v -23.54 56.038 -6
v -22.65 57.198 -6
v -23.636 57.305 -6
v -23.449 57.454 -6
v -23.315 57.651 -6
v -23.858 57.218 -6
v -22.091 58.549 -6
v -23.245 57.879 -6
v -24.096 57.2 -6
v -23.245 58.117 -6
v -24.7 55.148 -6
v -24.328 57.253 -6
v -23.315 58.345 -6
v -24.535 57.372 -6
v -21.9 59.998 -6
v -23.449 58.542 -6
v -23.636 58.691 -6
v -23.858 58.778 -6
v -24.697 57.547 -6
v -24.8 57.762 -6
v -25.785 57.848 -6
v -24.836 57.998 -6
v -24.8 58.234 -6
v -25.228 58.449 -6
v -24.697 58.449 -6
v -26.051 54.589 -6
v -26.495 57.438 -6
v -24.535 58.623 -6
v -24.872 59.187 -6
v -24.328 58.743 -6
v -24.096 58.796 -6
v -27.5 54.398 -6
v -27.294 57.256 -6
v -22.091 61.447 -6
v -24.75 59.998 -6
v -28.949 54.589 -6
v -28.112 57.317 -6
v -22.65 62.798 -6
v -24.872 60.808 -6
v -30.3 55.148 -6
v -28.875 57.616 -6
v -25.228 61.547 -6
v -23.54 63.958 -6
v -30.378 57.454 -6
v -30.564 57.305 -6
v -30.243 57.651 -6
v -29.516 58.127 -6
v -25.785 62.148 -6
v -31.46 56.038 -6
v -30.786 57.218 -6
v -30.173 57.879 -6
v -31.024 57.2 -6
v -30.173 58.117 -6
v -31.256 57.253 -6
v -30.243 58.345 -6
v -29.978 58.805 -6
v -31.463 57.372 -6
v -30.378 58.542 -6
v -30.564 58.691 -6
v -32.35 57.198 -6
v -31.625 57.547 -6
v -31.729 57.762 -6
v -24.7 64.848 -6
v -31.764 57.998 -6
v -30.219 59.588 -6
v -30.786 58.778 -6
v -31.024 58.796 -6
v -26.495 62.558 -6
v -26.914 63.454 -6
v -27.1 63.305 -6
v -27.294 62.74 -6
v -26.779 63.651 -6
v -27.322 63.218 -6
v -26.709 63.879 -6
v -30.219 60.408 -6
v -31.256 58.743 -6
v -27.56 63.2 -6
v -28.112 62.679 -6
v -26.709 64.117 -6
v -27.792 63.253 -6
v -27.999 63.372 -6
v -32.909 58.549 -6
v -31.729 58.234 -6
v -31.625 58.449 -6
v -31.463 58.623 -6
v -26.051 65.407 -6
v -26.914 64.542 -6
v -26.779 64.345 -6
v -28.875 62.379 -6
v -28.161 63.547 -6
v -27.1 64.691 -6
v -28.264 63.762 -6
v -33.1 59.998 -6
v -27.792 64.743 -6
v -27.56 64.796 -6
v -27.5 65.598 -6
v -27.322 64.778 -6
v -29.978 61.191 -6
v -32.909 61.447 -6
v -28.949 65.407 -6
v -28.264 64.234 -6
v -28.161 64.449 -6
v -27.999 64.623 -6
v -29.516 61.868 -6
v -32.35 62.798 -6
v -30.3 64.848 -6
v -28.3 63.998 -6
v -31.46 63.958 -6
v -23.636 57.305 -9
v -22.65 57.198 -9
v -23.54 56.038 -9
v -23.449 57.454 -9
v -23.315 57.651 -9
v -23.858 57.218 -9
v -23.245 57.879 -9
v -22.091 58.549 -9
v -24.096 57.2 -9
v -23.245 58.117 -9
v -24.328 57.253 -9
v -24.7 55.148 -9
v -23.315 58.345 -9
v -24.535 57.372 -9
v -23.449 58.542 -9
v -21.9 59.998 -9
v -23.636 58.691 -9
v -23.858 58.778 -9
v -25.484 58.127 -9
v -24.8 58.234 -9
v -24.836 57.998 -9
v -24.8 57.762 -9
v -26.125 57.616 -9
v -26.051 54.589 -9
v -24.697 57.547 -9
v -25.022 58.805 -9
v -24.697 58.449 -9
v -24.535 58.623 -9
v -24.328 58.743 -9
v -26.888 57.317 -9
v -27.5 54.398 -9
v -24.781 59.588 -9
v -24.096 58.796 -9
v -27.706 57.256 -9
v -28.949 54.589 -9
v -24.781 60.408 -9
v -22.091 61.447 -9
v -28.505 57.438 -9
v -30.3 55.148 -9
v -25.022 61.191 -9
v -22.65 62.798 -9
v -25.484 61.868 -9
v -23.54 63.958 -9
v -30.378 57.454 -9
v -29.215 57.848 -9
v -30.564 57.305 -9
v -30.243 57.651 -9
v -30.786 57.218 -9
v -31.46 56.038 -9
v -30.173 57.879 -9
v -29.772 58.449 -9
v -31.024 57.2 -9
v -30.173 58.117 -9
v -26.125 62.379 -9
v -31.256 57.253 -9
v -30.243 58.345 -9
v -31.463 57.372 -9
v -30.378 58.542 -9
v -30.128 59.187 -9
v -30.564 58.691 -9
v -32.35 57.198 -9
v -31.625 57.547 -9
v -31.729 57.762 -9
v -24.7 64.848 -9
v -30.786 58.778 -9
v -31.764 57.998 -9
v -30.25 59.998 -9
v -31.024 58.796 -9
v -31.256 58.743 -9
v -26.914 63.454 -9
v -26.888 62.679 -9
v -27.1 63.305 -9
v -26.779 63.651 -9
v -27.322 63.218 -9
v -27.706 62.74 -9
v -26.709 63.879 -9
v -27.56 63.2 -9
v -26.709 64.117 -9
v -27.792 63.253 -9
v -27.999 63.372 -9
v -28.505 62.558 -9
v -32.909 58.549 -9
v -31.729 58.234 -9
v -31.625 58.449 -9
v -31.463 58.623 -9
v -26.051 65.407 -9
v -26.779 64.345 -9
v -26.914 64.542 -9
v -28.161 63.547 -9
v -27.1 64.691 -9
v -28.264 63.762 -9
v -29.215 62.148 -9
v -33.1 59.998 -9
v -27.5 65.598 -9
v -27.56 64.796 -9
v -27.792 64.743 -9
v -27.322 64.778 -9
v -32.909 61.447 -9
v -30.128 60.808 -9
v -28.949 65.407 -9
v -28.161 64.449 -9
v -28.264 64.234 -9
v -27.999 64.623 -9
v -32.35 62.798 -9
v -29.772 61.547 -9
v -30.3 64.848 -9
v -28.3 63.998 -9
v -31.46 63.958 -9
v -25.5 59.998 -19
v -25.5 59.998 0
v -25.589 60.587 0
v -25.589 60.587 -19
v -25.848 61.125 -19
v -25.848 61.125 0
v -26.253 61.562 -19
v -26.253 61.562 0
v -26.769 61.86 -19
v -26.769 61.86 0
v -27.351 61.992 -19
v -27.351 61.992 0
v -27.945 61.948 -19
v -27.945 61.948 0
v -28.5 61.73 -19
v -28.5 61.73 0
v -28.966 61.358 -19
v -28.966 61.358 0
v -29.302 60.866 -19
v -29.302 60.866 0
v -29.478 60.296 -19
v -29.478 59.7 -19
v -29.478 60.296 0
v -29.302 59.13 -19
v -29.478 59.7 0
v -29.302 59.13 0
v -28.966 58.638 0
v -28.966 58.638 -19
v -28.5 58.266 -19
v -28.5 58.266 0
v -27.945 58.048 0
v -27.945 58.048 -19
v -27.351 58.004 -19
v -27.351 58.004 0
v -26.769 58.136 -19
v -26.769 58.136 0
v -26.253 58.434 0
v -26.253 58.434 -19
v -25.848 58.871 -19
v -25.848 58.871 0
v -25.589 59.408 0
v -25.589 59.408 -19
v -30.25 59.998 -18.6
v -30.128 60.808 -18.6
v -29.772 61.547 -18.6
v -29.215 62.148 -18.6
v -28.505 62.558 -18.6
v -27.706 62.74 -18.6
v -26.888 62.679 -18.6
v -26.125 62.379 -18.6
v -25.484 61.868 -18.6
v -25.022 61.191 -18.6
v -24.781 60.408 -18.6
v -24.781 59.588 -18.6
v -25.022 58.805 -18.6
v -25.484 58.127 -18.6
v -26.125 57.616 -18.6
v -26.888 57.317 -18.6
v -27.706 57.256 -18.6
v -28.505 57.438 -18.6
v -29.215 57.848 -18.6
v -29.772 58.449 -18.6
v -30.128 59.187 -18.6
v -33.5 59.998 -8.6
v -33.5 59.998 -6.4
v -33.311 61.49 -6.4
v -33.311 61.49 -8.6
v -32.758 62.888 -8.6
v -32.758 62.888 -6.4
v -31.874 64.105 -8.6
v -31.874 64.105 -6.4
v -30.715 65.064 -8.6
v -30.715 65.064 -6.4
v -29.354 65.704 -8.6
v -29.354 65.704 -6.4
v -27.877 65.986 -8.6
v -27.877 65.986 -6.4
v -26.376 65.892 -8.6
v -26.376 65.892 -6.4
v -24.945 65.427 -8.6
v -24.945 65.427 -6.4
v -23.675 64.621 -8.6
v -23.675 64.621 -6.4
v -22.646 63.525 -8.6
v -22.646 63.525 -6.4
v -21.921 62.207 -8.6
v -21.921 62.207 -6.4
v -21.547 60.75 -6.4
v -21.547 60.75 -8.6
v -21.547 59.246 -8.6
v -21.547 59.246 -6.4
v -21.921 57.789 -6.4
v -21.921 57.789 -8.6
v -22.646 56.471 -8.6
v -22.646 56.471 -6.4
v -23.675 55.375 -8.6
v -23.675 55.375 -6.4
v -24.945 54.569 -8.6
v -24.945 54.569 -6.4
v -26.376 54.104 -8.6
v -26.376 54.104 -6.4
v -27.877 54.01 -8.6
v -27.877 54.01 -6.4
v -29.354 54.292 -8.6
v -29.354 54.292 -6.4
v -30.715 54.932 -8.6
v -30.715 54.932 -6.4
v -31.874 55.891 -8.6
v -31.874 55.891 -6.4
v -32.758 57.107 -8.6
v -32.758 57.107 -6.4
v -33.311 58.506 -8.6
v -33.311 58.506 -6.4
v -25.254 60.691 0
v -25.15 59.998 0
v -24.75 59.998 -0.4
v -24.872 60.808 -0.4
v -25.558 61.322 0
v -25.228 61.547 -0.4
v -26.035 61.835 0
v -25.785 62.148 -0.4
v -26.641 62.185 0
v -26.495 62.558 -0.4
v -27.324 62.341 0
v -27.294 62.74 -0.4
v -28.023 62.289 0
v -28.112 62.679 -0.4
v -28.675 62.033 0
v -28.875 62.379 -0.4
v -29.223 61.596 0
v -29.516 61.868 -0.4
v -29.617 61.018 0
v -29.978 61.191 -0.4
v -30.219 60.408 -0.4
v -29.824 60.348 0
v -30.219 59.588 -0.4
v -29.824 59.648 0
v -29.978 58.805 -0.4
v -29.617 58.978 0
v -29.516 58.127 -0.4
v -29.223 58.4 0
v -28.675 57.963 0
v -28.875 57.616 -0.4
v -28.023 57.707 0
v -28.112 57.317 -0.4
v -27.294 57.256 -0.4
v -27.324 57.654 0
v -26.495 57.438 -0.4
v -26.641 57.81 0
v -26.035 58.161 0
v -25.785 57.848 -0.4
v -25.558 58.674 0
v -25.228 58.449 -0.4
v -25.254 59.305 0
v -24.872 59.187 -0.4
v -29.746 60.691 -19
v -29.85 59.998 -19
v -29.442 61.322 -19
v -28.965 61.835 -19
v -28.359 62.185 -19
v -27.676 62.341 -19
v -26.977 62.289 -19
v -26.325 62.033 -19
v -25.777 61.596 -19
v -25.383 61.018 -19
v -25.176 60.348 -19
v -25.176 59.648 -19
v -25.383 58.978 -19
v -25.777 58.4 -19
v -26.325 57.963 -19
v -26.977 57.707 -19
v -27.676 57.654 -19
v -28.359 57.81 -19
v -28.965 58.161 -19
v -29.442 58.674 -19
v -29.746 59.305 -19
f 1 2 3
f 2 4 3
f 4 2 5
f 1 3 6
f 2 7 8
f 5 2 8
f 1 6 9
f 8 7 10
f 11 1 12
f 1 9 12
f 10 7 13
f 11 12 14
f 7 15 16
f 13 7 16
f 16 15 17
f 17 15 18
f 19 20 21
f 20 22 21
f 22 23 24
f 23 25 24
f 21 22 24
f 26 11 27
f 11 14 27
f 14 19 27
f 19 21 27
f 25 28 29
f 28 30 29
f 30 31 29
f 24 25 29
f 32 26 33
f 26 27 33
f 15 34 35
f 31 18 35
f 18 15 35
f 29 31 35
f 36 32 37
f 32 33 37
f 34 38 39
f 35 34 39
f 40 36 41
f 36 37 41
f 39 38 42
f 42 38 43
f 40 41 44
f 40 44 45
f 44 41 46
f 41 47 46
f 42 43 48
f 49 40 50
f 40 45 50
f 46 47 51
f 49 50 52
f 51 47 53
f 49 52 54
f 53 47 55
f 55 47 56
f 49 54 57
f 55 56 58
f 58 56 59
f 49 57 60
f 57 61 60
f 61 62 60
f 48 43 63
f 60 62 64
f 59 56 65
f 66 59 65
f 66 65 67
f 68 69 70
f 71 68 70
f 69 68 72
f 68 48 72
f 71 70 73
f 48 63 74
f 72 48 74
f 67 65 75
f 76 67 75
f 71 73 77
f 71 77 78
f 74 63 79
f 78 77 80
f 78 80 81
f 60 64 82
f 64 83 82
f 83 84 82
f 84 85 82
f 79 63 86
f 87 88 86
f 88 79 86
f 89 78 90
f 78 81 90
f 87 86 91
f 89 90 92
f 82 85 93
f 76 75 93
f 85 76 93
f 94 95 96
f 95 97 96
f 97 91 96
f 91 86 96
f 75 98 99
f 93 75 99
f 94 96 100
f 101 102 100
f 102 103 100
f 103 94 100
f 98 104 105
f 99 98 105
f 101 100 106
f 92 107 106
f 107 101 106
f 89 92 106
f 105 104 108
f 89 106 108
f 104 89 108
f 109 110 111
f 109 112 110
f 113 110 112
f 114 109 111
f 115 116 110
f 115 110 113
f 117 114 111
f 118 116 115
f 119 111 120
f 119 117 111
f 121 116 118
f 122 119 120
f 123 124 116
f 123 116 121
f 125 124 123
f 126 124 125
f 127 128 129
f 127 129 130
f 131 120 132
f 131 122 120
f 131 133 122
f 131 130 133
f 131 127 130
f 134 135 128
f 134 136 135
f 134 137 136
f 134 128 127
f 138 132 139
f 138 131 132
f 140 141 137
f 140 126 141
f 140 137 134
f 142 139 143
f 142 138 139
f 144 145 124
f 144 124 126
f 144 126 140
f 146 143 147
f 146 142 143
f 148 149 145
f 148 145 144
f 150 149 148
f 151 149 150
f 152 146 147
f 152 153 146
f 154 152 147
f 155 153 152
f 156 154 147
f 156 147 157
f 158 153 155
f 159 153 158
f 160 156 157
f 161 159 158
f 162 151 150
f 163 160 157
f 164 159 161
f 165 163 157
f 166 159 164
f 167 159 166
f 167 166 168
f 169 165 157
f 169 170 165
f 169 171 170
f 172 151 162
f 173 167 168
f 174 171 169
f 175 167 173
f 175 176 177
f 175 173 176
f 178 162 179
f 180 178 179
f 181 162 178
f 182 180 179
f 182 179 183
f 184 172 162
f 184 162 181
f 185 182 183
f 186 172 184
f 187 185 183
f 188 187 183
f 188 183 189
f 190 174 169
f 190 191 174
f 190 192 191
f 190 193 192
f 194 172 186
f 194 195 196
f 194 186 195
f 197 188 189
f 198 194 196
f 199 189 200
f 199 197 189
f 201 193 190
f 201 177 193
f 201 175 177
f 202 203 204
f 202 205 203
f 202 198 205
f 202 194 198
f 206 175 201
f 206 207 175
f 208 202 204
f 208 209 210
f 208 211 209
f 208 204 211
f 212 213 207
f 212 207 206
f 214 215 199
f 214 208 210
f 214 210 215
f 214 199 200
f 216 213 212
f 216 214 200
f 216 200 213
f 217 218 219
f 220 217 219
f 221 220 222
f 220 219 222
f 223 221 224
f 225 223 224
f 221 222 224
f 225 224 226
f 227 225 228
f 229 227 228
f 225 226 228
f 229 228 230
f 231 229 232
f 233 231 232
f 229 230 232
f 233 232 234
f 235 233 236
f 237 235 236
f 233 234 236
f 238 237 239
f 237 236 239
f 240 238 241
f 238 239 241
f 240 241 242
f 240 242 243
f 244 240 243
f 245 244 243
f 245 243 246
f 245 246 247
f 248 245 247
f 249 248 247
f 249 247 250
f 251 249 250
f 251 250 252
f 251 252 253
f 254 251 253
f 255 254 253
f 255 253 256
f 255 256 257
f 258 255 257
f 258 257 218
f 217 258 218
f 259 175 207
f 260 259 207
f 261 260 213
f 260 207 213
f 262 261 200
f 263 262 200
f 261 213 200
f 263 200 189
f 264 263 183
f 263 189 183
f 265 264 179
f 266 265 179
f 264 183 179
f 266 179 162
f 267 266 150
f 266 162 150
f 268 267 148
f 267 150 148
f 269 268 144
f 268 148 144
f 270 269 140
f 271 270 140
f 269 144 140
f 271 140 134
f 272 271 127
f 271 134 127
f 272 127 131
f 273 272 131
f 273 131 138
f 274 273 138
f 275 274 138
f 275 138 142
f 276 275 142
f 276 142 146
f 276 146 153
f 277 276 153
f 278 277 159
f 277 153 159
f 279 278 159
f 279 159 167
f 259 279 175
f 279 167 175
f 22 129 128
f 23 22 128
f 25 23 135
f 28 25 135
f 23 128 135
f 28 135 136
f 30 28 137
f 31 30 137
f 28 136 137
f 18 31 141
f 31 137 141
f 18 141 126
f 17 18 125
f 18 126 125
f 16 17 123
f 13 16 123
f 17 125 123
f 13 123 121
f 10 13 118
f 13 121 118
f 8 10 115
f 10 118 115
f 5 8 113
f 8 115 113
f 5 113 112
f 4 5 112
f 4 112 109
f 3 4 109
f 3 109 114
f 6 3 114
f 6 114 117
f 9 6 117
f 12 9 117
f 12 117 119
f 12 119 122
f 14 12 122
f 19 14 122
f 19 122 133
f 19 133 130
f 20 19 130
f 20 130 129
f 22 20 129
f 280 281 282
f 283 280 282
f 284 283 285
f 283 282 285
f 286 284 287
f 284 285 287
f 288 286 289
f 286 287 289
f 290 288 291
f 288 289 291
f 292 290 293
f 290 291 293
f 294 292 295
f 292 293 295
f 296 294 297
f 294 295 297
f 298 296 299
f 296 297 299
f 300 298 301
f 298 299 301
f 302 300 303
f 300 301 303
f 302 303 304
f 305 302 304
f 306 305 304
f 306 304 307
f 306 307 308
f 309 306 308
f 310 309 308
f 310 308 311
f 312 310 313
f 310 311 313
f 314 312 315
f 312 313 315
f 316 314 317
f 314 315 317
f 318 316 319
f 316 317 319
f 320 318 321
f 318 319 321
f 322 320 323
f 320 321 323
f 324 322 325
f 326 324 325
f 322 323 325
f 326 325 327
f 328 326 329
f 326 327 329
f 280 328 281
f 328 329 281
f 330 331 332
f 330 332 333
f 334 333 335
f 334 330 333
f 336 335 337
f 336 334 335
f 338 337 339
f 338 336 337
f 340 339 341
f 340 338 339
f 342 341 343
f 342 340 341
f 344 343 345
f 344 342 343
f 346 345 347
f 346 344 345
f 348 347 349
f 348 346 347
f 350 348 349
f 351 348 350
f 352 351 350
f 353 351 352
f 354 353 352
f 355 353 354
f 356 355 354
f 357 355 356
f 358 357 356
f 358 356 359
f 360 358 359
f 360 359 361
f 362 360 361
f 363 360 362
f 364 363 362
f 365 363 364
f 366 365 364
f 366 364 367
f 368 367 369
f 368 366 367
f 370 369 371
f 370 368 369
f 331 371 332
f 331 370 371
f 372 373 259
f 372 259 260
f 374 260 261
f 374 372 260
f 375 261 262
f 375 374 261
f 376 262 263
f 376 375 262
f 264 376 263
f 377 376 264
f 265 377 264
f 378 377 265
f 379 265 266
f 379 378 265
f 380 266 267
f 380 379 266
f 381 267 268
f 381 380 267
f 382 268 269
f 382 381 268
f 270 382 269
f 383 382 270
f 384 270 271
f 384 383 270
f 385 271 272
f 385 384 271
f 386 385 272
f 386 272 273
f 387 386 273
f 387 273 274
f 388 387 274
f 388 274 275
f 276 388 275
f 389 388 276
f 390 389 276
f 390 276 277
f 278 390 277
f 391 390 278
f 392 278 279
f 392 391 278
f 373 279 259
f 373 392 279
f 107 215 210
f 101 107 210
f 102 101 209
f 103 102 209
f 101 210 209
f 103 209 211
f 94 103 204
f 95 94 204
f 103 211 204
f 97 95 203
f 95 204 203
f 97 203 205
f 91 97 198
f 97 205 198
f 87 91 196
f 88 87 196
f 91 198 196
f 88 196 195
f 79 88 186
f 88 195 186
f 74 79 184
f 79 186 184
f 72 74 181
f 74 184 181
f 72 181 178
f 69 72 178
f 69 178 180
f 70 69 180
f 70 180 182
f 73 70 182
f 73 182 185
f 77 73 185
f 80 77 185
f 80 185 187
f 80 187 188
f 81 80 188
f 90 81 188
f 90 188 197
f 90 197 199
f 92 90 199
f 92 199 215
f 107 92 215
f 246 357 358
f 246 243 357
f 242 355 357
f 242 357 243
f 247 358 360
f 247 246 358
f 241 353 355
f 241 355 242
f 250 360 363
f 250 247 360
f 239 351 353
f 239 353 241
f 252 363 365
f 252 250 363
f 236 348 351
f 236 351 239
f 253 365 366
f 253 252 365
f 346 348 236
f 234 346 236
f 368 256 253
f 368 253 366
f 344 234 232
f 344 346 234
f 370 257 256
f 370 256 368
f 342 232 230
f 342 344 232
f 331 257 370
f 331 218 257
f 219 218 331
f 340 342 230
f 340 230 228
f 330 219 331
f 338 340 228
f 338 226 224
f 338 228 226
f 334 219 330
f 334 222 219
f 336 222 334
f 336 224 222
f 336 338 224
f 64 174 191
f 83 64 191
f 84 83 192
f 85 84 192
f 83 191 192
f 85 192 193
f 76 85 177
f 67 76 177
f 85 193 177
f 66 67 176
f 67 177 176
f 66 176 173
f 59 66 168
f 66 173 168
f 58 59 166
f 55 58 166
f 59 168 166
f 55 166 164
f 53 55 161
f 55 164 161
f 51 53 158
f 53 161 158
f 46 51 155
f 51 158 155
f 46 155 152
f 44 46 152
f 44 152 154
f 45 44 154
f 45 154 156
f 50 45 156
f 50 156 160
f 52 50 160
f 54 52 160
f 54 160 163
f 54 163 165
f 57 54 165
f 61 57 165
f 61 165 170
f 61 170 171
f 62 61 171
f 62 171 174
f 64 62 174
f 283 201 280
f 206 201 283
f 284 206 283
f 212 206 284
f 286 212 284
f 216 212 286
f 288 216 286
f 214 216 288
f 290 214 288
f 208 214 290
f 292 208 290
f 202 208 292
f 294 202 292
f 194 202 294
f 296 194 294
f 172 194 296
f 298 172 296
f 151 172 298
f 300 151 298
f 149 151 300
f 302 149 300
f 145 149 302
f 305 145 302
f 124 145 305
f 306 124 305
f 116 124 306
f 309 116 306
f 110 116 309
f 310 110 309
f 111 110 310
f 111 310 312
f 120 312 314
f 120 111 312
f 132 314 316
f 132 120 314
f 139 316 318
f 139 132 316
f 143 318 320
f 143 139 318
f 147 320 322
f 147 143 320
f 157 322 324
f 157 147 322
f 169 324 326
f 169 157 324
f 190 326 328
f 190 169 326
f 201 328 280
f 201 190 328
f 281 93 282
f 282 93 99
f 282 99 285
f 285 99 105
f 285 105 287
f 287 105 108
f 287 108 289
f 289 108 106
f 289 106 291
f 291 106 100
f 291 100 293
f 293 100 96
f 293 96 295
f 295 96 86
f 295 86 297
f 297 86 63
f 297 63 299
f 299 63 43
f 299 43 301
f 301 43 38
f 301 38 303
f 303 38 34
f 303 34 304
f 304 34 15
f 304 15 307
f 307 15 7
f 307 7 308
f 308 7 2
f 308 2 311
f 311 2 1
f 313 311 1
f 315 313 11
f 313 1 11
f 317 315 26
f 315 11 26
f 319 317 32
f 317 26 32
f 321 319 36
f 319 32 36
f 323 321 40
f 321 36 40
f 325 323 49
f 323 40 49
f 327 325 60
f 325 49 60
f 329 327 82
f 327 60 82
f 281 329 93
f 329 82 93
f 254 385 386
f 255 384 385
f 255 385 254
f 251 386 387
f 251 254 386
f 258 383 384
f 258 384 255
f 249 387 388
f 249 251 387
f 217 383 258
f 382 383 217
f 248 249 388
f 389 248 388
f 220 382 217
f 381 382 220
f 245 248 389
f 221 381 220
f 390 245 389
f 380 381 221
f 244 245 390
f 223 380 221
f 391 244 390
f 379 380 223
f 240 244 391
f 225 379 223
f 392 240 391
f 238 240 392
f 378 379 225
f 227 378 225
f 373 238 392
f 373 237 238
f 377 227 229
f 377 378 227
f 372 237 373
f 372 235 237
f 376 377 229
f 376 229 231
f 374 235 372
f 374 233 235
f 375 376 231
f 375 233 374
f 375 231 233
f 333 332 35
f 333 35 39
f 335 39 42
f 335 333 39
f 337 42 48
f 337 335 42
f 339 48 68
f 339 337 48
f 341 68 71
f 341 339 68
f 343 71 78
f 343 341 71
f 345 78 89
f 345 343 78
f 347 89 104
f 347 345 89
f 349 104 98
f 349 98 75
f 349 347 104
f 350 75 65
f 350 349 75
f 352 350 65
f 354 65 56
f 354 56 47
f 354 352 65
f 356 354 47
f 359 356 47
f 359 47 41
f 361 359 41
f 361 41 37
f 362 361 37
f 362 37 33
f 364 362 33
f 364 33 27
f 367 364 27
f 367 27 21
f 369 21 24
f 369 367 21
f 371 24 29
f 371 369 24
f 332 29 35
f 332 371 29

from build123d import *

# Parameters (mm, degrees)
SKETCH1_R             = 2.75
BOSS_EXTRUDE1_DEPTH   = 6
SKETCH3_R             = 6
BOSS_EXTRUDE2_DEPTH   = 3
SKETCH4_R             = 2.75
BOSS_EXTRUDE3_DEPTH   = 10
M2X0_4_TAPPED_HOLE1_D = 1.6
CHAMFER1_SIZE         = 0.4
SKETCH7_R             = 2
CUT_EXTRUDE1_DEPTH    = 20


with BuildPart() as part:
    # Sketch1 → Boss-Extrude1 (new body)
    with BuildSketch(Plane.XY):
        with Locations((-27.5, 59.99791663)):
            Circle(SKETCH1_R)
    extrude(amount=-BOSS_EXTRUDE1_DEPTH)

    # Sketch3 → Boss-Extrude2 (add)
    with BuildSketch(Plane(origin=(0, 0, -6), x_dir=(-1, 0, 0), z_dir=(0, 0, -1))):
        with Locations((27.5, 59.99791663)):
            Circle(SKETCH3_R)
    extrude(amount=BOSS_EXTRUDE2_DEPTH)

    # Sketch4 → Boss-Extrude3 (add)
    with BuildSketch(Plane(origin=(0, 0, -9), x_dir=(-1, 0, 0), z_dir=(0, 0, -1))):
        with Locations((27.5, 59.99791663)):
            Circle(SKETCH4_R)
    extrude(amount=BOSS_EXTRUDE3_DEPTH)

    # M2x0.4 Tapped Hole1 (through all)
    with Locations(Plane.XY.offset(-6)):
        with Locations((-24.035898385, 57.99791663), (-30.964101615, 57.99791663), (-27.5, 63.99791663)):
            Hole(M2X0_4_TAPPED_HOLE1_D / 2)

    # Chamfer1
    chamfer1_edges = [part.edges().sort_by_distance(p)[0] for p in [
        (-24.75, 59.99791663, -19),
        (-30.25, 59.99791663, 0),
        (-21.5, 59.99791663, -6),
        (-21.5, 59.99791663, -9),
    ]]
    chamfer(chamfer1_edges, length=CHAMFER1_SIZE)

    # Sketch7 → Cut-Extrude1 (cut, through all)
    with BuildSketch(Plane.XY):
        with Locations((-27.5, 59.99791663)):
            Circle(SKETCH7_R)
    extrude(amount=-CUT_EXTRUDE1_DEPTH, mode=Mode.SUBTRACT)


solid = part.part
